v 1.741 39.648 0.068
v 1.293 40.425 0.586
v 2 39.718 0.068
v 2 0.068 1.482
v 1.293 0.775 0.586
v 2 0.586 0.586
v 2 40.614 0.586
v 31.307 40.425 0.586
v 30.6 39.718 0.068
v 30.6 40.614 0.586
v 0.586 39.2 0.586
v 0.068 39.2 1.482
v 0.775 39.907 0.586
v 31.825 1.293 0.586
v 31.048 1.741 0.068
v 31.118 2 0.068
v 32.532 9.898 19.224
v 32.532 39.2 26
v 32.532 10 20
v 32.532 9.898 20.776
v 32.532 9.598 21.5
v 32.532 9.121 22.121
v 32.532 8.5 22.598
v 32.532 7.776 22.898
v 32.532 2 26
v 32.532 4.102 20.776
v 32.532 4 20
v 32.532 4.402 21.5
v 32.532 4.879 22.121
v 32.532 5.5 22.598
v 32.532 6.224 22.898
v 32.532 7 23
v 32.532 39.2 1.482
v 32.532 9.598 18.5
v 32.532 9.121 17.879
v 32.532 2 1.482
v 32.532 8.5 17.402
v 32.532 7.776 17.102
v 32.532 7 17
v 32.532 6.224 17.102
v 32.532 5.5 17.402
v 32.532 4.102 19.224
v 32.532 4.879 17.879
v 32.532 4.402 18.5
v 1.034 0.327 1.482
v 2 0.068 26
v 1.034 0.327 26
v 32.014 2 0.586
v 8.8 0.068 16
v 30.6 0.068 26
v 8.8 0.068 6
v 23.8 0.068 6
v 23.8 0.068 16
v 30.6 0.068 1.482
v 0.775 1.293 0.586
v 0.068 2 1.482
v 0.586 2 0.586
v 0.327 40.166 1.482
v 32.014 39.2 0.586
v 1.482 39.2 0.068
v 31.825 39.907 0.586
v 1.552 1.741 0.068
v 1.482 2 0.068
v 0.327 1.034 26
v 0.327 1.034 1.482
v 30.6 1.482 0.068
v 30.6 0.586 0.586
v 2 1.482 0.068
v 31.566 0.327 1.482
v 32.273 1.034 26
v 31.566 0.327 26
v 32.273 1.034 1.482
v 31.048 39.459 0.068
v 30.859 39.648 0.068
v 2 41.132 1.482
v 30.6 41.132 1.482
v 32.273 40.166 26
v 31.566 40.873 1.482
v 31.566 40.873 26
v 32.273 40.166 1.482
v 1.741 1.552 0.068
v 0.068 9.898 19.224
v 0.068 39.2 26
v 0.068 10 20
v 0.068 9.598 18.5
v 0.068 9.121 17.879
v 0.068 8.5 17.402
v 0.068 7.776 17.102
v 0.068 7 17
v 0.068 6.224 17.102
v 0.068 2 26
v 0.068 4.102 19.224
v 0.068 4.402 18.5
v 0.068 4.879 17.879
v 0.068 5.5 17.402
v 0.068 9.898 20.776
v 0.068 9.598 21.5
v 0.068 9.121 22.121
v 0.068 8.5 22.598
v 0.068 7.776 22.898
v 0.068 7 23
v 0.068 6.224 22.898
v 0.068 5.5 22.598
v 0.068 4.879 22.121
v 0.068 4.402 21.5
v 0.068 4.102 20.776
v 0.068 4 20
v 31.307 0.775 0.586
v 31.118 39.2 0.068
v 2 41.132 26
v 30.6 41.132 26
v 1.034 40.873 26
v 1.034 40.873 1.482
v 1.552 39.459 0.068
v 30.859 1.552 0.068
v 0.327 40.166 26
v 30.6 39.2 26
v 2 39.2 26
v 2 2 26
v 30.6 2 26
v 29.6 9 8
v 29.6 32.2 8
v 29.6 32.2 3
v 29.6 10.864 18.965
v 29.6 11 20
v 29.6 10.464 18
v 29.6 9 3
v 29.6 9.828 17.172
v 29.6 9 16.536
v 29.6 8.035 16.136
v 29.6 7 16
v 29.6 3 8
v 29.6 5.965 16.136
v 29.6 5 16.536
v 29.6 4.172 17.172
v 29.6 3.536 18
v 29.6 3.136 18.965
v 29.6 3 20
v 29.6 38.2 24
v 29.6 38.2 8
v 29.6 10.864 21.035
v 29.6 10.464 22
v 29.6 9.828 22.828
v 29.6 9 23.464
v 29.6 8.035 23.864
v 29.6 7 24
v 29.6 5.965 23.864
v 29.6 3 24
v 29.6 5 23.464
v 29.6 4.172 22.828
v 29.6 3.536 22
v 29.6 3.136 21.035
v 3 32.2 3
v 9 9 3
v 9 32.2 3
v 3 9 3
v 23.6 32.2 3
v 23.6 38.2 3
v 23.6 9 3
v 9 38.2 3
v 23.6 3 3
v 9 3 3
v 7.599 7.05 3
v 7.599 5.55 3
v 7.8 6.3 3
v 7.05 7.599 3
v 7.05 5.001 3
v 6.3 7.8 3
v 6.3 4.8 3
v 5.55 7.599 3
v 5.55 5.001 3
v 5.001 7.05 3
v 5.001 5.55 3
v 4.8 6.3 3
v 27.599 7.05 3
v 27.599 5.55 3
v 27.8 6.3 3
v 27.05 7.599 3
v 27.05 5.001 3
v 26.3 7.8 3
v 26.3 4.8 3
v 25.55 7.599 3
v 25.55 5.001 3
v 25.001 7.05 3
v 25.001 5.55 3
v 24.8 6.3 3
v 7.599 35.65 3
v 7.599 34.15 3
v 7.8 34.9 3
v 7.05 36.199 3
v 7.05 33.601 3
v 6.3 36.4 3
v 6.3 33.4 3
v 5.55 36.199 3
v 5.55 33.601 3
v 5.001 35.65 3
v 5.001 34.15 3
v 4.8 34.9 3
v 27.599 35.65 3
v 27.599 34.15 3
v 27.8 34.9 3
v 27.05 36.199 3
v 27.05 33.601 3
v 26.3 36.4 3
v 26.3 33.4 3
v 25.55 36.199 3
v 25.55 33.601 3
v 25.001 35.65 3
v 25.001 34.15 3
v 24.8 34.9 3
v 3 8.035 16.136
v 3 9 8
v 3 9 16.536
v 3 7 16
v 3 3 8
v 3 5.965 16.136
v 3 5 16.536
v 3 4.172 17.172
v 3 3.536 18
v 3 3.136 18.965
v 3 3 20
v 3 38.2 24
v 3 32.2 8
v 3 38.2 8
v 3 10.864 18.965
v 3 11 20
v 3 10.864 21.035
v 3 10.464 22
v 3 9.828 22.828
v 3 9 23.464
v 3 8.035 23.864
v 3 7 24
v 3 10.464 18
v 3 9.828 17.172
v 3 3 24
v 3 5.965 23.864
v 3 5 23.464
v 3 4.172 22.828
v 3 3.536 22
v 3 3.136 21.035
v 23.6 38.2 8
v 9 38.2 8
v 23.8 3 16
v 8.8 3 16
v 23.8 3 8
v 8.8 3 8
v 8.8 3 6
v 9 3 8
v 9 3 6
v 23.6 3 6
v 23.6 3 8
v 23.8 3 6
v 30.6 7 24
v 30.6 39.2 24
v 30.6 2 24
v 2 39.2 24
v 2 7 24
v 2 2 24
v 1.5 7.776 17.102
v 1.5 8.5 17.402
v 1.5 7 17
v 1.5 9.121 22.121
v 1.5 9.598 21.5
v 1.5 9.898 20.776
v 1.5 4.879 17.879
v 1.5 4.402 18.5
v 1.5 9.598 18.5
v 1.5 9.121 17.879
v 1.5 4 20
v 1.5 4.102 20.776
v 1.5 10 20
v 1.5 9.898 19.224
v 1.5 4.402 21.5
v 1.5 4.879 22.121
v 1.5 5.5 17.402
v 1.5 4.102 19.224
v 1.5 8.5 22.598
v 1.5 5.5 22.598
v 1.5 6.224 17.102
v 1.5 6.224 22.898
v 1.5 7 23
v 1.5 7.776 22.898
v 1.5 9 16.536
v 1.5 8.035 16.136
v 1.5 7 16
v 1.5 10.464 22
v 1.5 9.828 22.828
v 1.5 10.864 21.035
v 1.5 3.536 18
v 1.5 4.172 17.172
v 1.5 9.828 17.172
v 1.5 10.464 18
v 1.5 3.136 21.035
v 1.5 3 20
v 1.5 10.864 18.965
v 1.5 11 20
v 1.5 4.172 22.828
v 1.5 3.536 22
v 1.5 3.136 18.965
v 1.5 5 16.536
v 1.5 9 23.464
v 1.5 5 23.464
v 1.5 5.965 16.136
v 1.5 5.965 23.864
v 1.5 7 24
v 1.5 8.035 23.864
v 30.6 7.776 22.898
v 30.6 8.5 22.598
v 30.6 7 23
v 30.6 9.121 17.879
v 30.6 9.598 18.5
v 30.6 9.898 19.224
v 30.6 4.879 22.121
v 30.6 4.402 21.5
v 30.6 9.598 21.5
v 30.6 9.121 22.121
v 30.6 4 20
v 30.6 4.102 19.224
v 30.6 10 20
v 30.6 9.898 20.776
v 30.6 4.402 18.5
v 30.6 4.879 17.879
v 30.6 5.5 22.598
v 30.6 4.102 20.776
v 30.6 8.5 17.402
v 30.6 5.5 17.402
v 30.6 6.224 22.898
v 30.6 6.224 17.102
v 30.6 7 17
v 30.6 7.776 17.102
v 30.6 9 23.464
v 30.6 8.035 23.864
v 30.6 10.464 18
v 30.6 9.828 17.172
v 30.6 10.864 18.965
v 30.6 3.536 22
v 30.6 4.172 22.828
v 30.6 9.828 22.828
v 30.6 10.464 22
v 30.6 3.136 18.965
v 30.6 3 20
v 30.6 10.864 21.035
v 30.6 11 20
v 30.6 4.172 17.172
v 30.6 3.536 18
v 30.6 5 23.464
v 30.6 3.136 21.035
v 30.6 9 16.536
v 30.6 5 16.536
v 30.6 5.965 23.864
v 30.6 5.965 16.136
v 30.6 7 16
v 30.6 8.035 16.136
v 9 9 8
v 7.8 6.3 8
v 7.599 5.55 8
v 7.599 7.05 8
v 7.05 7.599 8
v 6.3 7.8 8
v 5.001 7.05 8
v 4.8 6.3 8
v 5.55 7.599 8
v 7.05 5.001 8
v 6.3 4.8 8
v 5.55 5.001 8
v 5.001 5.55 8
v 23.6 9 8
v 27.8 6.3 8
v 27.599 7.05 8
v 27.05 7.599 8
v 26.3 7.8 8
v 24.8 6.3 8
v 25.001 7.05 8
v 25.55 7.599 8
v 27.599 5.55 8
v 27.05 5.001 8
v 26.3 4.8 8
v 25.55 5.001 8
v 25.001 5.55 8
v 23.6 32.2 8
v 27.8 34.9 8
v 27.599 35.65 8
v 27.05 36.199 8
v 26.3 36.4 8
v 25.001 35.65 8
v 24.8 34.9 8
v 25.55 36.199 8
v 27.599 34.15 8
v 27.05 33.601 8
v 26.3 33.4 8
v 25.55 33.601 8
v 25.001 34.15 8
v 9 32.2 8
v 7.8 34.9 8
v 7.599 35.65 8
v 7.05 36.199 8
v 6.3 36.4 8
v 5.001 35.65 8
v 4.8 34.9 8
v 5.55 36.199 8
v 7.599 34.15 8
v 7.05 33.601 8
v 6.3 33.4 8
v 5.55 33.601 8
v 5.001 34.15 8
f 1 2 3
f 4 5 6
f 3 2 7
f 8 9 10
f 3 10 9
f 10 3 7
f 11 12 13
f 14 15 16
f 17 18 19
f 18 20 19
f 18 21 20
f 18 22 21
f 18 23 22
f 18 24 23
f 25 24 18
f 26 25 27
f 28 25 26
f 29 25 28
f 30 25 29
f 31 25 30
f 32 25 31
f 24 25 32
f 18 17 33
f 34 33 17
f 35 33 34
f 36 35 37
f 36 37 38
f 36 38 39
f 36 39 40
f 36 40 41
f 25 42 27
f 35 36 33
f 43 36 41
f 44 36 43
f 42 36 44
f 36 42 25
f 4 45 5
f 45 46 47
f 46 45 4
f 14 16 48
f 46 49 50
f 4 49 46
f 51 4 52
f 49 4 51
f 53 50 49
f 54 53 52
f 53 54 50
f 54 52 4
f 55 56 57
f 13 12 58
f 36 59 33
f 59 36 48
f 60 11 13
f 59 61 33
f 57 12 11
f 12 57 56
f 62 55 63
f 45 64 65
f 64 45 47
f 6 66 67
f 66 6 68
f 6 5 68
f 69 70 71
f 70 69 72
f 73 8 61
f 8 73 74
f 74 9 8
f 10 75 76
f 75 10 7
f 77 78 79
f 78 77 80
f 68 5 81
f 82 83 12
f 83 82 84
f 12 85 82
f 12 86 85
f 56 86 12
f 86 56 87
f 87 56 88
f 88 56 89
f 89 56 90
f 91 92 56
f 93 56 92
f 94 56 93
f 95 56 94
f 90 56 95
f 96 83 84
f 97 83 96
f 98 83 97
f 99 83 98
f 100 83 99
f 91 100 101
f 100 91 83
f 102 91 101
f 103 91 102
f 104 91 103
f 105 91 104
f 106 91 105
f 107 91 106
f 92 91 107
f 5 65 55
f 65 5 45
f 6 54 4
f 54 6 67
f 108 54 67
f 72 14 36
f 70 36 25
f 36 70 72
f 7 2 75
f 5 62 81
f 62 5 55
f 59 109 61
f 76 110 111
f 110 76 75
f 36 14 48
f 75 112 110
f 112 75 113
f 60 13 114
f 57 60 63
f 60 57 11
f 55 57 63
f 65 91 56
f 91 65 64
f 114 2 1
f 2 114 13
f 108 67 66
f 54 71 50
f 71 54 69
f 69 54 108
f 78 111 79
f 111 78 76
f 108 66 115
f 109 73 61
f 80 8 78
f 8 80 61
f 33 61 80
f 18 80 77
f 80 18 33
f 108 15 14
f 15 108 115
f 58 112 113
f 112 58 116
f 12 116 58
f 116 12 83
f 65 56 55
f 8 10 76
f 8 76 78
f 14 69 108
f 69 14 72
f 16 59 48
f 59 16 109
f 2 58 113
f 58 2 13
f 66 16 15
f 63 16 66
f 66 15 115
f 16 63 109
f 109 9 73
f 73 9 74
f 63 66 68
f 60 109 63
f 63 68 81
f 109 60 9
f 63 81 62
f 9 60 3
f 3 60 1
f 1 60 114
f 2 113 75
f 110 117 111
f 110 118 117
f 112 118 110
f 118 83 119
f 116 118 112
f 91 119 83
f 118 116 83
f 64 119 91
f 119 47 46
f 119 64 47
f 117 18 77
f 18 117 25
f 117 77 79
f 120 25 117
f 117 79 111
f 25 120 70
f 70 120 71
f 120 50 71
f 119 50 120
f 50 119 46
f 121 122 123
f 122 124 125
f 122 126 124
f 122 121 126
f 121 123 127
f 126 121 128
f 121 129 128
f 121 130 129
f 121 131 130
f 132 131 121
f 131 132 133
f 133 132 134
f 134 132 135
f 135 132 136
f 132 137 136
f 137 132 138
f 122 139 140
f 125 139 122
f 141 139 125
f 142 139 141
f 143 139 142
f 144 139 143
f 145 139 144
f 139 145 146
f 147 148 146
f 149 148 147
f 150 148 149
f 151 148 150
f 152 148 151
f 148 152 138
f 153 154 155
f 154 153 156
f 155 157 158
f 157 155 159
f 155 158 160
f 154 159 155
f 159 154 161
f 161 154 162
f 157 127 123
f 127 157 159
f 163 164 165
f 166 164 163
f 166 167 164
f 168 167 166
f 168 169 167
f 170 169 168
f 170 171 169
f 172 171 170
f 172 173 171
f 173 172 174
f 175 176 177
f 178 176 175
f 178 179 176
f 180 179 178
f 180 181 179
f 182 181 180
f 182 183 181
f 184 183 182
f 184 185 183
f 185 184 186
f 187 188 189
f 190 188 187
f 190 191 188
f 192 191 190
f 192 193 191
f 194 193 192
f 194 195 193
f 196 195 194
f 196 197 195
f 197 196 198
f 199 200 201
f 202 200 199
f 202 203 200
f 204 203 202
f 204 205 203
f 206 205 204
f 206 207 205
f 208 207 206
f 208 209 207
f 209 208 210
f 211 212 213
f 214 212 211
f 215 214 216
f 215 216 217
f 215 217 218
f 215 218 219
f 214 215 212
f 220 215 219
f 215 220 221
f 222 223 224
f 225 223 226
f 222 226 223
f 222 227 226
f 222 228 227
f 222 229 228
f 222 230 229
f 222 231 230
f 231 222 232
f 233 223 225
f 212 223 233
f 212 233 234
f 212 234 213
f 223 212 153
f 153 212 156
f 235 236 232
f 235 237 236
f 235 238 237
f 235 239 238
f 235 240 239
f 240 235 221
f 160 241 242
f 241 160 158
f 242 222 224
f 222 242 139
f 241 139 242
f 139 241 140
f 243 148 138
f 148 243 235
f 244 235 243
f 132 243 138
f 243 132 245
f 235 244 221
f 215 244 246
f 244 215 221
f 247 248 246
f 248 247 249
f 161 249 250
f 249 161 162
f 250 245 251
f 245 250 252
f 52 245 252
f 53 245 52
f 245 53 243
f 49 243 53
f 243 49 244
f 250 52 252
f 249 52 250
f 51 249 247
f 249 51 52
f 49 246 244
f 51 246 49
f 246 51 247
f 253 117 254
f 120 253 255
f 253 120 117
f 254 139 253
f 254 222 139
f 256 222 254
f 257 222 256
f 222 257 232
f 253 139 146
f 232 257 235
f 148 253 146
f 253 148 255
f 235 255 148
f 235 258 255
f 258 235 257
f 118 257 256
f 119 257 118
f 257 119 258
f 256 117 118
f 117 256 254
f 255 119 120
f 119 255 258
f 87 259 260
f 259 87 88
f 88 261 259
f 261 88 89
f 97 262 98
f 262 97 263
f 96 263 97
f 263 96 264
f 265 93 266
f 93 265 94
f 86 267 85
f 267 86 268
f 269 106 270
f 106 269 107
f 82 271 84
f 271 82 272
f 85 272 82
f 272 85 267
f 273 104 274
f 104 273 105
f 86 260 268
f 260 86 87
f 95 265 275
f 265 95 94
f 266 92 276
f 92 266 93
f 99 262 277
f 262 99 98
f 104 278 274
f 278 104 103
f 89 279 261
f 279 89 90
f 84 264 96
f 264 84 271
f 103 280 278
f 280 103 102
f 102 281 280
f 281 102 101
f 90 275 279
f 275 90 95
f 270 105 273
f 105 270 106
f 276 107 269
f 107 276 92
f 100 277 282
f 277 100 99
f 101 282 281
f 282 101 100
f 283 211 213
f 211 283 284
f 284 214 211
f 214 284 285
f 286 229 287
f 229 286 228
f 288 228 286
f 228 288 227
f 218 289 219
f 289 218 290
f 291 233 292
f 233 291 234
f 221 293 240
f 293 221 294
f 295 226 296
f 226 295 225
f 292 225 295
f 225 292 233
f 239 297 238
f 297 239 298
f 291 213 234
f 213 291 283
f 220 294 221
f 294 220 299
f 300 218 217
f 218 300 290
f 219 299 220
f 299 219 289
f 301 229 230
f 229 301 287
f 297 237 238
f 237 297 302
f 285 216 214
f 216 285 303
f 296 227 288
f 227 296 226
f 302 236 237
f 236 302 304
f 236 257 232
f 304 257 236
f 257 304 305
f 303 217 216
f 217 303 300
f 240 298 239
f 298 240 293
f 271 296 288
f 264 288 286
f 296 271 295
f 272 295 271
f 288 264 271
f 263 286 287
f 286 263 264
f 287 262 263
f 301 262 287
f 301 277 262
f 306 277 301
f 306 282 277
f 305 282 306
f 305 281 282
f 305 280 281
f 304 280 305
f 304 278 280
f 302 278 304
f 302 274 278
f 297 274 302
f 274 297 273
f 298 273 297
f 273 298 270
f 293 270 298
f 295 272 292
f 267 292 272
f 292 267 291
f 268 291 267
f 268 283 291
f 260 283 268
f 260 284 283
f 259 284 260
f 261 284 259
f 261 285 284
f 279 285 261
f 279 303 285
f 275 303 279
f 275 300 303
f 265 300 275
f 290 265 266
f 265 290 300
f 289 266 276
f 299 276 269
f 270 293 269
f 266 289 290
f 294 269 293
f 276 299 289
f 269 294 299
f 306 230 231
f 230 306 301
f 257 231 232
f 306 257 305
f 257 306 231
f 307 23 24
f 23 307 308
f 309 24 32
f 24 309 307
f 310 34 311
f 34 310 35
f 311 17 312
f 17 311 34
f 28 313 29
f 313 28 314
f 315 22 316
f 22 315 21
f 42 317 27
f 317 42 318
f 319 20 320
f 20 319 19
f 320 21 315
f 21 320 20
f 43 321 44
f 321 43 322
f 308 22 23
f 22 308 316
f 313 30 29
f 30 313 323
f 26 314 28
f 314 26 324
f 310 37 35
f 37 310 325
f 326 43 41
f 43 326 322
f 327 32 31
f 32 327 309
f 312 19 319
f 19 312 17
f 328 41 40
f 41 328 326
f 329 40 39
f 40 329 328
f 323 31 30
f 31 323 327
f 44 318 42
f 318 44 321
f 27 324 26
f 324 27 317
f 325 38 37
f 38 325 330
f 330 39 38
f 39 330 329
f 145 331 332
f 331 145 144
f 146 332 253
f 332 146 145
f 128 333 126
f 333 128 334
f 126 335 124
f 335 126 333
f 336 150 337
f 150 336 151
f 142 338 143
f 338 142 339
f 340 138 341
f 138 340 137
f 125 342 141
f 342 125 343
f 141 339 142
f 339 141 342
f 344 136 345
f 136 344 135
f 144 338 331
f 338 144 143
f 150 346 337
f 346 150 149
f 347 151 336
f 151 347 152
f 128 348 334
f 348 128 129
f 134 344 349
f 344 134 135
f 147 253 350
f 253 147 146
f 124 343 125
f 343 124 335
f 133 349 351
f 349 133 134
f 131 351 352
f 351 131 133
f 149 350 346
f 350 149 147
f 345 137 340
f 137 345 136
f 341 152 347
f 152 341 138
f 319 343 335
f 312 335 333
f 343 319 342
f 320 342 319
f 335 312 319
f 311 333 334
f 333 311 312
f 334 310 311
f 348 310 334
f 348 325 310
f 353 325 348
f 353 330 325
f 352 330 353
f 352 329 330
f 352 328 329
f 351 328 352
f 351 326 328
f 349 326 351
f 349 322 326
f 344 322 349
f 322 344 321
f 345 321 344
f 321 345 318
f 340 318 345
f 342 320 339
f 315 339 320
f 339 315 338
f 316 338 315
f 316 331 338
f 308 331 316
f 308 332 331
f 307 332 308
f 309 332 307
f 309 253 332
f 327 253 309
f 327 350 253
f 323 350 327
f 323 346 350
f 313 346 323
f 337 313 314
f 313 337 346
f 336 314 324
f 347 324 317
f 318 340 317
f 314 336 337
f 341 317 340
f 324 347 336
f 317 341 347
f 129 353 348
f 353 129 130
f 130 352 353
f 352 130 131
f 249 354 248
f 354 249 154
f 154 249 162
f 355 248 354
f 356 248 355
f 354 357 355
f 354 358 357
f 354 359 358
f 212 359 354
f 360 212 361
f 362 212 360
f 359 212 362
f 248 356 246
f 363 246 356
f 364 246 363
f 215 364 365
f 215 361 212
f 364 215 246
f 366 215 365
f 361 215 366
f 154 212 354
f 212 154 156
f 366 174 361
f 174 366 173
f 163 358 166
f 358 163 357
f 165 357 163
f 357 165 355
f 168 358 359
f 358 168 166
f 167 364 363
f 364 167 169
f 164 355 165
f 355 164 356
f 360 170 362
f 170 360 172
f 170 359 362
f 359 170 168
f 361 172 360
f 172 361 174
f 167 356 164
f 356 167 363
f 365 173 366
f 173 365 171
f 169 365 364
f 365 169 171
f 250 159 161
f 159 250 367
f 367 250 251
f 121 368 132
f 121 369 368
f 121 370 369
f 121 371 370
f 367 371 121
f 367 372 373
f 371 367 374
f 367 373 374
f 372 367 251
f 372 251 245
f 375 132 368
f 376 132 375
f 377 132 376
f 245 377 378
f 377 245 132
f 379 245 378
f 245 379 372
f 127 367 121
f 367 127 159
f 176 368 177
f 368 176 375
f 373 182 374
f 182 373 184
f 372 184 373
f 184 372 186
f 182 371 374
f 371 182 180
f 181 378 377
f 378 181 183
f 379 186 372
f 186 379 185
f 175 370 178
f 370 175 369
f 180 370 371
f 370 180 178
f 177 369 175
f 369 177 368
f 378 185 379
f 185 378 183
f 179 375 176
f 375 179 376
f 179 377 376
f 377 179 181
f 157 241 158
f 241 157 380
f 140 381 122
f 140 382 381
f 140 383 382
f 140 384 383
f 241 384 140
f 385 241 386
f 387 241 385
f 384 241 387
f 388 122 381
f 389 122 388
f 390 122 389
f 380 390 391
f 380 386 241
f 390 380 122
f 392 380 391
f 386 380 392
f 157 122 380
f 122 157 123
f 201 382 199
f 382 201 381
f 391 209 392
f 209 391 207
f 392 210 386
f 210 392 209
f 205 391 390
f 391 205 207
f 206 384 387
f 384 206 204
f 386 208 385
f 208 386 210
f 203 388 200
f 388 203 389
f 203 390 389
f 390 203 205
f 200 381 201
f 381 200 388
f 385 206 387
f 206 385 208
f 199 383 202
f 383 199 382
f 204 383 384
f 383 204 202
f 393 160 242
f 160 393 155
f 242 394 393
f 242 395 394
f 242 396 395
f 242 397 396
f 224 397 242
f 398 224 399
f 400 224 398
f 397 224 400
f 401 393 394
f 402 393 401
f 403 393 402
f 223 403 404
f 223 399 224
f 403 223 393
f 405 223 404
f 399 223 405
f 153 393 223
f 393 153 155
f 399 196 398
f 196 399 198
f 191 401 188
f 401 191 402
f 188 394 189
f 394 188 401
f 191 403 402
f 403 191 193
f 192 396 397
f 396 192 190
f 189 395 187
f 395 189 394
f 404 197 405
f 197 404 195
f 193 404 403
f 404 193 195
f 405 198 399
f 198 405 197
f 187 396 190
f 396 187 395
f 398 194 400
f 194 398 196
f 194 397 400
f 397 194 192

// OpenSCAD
union() {
	difference() {
		difference() {
			difference() {
				difference() {
					difference() {
						difference() {
							minkowski() {
								translate(v = [2, 2, 2]) {
									cube(size = [28.6000000000, 37.2000000000, 24.0000000000]);
								}
								sphere($fn = 12, r = 2);
							}
							translate(v = [0, 0, 26.0000000000]) {
								cube(size = [32.6000000000, 41.2000000000, 3]);
							}
						}
						translate(v = [3, 3, 3]) {
							cube(size = [26.6000000000, 35.2000000000, 24.0000000000]);
						}
					}
					translate(v = [8.8000000000, -1, 6]) {
						cube(size = [15, 5, 10]);
					}
				}
				translate(v = [2, 2, 24.0000000000]) {
					cube(size = [28.6000000000, 37.2000000000, 3]);
				}
			}
			translate(v = [-0.5000000000, 7, 20]) {
				rotate(a = 90, v = [0, 1, 0]) {
					cylinder($fn = 24, h = 4, r = 3);
					translate(v = [0, 0, 2.0000000000]) {
						cylinder($fn = 24, h = 3, r = 4);
					}
				}
			}
		}
		translate(v = [32.6000000000, 7, 20]) {
			rotate(a = -90, v = [0, 1, 0]) {
				cylinder($fn = 24, h = 4, r = 3);
				translate(v = [0, 0, 2.0000000000]) {
					cylinder($fn = 24, h = 3, r = 4);
				}
			}
		}
	}
	translate(v = [3, 3, 3]) {
		difference() {
			cube(size = [6, 6, 5]);
			translate(v = [3.3000000000, 3.3000000000, 0]) {
				cylinder($fn = 12, h = 5.1000000000, r = 1.5000000000);
			}
		}
	}
	translate(v = [29.6000000000, 3, 3]) {
		scale(v = [-1, 1, 1]) {
			difference() {
				cube(size = [6, 6, 5]);
				translate(v = [3.3000000000, 3.3000000000, 0]) {
					cylinder($fn = 12, h = 5.1000000000, r = 1.5000000000);
				}
			}
		}
	}
	translate(v = [29.6000000000, 38.2000000000, 3]) {
		scale(v = [1, -1, 1]) {
			scale(v = [-1, 1, 1]) {
				difference() {
					cube(size = [6, 6, 5]);
					translate(v = [3.3000000000, 3.3000000000, 0]) {
						cylinder($fn = 12, h = 5.1000000000, r = 1.5000000000);
					}
				}
			}
		}
	}
	translate(v = [3, 38.2000000000, 3]) {
		scale(v = [1, -1, 1]) {
			difference() {
				cube(size = [6, 6, 5]);
				translate(v = [3.3000000000, 3.3000000000, 0]) {
					cylinder($fn = 12, h = 5.1000000000, r = 1.5000000000);
				}
			}
		}
	}
}
